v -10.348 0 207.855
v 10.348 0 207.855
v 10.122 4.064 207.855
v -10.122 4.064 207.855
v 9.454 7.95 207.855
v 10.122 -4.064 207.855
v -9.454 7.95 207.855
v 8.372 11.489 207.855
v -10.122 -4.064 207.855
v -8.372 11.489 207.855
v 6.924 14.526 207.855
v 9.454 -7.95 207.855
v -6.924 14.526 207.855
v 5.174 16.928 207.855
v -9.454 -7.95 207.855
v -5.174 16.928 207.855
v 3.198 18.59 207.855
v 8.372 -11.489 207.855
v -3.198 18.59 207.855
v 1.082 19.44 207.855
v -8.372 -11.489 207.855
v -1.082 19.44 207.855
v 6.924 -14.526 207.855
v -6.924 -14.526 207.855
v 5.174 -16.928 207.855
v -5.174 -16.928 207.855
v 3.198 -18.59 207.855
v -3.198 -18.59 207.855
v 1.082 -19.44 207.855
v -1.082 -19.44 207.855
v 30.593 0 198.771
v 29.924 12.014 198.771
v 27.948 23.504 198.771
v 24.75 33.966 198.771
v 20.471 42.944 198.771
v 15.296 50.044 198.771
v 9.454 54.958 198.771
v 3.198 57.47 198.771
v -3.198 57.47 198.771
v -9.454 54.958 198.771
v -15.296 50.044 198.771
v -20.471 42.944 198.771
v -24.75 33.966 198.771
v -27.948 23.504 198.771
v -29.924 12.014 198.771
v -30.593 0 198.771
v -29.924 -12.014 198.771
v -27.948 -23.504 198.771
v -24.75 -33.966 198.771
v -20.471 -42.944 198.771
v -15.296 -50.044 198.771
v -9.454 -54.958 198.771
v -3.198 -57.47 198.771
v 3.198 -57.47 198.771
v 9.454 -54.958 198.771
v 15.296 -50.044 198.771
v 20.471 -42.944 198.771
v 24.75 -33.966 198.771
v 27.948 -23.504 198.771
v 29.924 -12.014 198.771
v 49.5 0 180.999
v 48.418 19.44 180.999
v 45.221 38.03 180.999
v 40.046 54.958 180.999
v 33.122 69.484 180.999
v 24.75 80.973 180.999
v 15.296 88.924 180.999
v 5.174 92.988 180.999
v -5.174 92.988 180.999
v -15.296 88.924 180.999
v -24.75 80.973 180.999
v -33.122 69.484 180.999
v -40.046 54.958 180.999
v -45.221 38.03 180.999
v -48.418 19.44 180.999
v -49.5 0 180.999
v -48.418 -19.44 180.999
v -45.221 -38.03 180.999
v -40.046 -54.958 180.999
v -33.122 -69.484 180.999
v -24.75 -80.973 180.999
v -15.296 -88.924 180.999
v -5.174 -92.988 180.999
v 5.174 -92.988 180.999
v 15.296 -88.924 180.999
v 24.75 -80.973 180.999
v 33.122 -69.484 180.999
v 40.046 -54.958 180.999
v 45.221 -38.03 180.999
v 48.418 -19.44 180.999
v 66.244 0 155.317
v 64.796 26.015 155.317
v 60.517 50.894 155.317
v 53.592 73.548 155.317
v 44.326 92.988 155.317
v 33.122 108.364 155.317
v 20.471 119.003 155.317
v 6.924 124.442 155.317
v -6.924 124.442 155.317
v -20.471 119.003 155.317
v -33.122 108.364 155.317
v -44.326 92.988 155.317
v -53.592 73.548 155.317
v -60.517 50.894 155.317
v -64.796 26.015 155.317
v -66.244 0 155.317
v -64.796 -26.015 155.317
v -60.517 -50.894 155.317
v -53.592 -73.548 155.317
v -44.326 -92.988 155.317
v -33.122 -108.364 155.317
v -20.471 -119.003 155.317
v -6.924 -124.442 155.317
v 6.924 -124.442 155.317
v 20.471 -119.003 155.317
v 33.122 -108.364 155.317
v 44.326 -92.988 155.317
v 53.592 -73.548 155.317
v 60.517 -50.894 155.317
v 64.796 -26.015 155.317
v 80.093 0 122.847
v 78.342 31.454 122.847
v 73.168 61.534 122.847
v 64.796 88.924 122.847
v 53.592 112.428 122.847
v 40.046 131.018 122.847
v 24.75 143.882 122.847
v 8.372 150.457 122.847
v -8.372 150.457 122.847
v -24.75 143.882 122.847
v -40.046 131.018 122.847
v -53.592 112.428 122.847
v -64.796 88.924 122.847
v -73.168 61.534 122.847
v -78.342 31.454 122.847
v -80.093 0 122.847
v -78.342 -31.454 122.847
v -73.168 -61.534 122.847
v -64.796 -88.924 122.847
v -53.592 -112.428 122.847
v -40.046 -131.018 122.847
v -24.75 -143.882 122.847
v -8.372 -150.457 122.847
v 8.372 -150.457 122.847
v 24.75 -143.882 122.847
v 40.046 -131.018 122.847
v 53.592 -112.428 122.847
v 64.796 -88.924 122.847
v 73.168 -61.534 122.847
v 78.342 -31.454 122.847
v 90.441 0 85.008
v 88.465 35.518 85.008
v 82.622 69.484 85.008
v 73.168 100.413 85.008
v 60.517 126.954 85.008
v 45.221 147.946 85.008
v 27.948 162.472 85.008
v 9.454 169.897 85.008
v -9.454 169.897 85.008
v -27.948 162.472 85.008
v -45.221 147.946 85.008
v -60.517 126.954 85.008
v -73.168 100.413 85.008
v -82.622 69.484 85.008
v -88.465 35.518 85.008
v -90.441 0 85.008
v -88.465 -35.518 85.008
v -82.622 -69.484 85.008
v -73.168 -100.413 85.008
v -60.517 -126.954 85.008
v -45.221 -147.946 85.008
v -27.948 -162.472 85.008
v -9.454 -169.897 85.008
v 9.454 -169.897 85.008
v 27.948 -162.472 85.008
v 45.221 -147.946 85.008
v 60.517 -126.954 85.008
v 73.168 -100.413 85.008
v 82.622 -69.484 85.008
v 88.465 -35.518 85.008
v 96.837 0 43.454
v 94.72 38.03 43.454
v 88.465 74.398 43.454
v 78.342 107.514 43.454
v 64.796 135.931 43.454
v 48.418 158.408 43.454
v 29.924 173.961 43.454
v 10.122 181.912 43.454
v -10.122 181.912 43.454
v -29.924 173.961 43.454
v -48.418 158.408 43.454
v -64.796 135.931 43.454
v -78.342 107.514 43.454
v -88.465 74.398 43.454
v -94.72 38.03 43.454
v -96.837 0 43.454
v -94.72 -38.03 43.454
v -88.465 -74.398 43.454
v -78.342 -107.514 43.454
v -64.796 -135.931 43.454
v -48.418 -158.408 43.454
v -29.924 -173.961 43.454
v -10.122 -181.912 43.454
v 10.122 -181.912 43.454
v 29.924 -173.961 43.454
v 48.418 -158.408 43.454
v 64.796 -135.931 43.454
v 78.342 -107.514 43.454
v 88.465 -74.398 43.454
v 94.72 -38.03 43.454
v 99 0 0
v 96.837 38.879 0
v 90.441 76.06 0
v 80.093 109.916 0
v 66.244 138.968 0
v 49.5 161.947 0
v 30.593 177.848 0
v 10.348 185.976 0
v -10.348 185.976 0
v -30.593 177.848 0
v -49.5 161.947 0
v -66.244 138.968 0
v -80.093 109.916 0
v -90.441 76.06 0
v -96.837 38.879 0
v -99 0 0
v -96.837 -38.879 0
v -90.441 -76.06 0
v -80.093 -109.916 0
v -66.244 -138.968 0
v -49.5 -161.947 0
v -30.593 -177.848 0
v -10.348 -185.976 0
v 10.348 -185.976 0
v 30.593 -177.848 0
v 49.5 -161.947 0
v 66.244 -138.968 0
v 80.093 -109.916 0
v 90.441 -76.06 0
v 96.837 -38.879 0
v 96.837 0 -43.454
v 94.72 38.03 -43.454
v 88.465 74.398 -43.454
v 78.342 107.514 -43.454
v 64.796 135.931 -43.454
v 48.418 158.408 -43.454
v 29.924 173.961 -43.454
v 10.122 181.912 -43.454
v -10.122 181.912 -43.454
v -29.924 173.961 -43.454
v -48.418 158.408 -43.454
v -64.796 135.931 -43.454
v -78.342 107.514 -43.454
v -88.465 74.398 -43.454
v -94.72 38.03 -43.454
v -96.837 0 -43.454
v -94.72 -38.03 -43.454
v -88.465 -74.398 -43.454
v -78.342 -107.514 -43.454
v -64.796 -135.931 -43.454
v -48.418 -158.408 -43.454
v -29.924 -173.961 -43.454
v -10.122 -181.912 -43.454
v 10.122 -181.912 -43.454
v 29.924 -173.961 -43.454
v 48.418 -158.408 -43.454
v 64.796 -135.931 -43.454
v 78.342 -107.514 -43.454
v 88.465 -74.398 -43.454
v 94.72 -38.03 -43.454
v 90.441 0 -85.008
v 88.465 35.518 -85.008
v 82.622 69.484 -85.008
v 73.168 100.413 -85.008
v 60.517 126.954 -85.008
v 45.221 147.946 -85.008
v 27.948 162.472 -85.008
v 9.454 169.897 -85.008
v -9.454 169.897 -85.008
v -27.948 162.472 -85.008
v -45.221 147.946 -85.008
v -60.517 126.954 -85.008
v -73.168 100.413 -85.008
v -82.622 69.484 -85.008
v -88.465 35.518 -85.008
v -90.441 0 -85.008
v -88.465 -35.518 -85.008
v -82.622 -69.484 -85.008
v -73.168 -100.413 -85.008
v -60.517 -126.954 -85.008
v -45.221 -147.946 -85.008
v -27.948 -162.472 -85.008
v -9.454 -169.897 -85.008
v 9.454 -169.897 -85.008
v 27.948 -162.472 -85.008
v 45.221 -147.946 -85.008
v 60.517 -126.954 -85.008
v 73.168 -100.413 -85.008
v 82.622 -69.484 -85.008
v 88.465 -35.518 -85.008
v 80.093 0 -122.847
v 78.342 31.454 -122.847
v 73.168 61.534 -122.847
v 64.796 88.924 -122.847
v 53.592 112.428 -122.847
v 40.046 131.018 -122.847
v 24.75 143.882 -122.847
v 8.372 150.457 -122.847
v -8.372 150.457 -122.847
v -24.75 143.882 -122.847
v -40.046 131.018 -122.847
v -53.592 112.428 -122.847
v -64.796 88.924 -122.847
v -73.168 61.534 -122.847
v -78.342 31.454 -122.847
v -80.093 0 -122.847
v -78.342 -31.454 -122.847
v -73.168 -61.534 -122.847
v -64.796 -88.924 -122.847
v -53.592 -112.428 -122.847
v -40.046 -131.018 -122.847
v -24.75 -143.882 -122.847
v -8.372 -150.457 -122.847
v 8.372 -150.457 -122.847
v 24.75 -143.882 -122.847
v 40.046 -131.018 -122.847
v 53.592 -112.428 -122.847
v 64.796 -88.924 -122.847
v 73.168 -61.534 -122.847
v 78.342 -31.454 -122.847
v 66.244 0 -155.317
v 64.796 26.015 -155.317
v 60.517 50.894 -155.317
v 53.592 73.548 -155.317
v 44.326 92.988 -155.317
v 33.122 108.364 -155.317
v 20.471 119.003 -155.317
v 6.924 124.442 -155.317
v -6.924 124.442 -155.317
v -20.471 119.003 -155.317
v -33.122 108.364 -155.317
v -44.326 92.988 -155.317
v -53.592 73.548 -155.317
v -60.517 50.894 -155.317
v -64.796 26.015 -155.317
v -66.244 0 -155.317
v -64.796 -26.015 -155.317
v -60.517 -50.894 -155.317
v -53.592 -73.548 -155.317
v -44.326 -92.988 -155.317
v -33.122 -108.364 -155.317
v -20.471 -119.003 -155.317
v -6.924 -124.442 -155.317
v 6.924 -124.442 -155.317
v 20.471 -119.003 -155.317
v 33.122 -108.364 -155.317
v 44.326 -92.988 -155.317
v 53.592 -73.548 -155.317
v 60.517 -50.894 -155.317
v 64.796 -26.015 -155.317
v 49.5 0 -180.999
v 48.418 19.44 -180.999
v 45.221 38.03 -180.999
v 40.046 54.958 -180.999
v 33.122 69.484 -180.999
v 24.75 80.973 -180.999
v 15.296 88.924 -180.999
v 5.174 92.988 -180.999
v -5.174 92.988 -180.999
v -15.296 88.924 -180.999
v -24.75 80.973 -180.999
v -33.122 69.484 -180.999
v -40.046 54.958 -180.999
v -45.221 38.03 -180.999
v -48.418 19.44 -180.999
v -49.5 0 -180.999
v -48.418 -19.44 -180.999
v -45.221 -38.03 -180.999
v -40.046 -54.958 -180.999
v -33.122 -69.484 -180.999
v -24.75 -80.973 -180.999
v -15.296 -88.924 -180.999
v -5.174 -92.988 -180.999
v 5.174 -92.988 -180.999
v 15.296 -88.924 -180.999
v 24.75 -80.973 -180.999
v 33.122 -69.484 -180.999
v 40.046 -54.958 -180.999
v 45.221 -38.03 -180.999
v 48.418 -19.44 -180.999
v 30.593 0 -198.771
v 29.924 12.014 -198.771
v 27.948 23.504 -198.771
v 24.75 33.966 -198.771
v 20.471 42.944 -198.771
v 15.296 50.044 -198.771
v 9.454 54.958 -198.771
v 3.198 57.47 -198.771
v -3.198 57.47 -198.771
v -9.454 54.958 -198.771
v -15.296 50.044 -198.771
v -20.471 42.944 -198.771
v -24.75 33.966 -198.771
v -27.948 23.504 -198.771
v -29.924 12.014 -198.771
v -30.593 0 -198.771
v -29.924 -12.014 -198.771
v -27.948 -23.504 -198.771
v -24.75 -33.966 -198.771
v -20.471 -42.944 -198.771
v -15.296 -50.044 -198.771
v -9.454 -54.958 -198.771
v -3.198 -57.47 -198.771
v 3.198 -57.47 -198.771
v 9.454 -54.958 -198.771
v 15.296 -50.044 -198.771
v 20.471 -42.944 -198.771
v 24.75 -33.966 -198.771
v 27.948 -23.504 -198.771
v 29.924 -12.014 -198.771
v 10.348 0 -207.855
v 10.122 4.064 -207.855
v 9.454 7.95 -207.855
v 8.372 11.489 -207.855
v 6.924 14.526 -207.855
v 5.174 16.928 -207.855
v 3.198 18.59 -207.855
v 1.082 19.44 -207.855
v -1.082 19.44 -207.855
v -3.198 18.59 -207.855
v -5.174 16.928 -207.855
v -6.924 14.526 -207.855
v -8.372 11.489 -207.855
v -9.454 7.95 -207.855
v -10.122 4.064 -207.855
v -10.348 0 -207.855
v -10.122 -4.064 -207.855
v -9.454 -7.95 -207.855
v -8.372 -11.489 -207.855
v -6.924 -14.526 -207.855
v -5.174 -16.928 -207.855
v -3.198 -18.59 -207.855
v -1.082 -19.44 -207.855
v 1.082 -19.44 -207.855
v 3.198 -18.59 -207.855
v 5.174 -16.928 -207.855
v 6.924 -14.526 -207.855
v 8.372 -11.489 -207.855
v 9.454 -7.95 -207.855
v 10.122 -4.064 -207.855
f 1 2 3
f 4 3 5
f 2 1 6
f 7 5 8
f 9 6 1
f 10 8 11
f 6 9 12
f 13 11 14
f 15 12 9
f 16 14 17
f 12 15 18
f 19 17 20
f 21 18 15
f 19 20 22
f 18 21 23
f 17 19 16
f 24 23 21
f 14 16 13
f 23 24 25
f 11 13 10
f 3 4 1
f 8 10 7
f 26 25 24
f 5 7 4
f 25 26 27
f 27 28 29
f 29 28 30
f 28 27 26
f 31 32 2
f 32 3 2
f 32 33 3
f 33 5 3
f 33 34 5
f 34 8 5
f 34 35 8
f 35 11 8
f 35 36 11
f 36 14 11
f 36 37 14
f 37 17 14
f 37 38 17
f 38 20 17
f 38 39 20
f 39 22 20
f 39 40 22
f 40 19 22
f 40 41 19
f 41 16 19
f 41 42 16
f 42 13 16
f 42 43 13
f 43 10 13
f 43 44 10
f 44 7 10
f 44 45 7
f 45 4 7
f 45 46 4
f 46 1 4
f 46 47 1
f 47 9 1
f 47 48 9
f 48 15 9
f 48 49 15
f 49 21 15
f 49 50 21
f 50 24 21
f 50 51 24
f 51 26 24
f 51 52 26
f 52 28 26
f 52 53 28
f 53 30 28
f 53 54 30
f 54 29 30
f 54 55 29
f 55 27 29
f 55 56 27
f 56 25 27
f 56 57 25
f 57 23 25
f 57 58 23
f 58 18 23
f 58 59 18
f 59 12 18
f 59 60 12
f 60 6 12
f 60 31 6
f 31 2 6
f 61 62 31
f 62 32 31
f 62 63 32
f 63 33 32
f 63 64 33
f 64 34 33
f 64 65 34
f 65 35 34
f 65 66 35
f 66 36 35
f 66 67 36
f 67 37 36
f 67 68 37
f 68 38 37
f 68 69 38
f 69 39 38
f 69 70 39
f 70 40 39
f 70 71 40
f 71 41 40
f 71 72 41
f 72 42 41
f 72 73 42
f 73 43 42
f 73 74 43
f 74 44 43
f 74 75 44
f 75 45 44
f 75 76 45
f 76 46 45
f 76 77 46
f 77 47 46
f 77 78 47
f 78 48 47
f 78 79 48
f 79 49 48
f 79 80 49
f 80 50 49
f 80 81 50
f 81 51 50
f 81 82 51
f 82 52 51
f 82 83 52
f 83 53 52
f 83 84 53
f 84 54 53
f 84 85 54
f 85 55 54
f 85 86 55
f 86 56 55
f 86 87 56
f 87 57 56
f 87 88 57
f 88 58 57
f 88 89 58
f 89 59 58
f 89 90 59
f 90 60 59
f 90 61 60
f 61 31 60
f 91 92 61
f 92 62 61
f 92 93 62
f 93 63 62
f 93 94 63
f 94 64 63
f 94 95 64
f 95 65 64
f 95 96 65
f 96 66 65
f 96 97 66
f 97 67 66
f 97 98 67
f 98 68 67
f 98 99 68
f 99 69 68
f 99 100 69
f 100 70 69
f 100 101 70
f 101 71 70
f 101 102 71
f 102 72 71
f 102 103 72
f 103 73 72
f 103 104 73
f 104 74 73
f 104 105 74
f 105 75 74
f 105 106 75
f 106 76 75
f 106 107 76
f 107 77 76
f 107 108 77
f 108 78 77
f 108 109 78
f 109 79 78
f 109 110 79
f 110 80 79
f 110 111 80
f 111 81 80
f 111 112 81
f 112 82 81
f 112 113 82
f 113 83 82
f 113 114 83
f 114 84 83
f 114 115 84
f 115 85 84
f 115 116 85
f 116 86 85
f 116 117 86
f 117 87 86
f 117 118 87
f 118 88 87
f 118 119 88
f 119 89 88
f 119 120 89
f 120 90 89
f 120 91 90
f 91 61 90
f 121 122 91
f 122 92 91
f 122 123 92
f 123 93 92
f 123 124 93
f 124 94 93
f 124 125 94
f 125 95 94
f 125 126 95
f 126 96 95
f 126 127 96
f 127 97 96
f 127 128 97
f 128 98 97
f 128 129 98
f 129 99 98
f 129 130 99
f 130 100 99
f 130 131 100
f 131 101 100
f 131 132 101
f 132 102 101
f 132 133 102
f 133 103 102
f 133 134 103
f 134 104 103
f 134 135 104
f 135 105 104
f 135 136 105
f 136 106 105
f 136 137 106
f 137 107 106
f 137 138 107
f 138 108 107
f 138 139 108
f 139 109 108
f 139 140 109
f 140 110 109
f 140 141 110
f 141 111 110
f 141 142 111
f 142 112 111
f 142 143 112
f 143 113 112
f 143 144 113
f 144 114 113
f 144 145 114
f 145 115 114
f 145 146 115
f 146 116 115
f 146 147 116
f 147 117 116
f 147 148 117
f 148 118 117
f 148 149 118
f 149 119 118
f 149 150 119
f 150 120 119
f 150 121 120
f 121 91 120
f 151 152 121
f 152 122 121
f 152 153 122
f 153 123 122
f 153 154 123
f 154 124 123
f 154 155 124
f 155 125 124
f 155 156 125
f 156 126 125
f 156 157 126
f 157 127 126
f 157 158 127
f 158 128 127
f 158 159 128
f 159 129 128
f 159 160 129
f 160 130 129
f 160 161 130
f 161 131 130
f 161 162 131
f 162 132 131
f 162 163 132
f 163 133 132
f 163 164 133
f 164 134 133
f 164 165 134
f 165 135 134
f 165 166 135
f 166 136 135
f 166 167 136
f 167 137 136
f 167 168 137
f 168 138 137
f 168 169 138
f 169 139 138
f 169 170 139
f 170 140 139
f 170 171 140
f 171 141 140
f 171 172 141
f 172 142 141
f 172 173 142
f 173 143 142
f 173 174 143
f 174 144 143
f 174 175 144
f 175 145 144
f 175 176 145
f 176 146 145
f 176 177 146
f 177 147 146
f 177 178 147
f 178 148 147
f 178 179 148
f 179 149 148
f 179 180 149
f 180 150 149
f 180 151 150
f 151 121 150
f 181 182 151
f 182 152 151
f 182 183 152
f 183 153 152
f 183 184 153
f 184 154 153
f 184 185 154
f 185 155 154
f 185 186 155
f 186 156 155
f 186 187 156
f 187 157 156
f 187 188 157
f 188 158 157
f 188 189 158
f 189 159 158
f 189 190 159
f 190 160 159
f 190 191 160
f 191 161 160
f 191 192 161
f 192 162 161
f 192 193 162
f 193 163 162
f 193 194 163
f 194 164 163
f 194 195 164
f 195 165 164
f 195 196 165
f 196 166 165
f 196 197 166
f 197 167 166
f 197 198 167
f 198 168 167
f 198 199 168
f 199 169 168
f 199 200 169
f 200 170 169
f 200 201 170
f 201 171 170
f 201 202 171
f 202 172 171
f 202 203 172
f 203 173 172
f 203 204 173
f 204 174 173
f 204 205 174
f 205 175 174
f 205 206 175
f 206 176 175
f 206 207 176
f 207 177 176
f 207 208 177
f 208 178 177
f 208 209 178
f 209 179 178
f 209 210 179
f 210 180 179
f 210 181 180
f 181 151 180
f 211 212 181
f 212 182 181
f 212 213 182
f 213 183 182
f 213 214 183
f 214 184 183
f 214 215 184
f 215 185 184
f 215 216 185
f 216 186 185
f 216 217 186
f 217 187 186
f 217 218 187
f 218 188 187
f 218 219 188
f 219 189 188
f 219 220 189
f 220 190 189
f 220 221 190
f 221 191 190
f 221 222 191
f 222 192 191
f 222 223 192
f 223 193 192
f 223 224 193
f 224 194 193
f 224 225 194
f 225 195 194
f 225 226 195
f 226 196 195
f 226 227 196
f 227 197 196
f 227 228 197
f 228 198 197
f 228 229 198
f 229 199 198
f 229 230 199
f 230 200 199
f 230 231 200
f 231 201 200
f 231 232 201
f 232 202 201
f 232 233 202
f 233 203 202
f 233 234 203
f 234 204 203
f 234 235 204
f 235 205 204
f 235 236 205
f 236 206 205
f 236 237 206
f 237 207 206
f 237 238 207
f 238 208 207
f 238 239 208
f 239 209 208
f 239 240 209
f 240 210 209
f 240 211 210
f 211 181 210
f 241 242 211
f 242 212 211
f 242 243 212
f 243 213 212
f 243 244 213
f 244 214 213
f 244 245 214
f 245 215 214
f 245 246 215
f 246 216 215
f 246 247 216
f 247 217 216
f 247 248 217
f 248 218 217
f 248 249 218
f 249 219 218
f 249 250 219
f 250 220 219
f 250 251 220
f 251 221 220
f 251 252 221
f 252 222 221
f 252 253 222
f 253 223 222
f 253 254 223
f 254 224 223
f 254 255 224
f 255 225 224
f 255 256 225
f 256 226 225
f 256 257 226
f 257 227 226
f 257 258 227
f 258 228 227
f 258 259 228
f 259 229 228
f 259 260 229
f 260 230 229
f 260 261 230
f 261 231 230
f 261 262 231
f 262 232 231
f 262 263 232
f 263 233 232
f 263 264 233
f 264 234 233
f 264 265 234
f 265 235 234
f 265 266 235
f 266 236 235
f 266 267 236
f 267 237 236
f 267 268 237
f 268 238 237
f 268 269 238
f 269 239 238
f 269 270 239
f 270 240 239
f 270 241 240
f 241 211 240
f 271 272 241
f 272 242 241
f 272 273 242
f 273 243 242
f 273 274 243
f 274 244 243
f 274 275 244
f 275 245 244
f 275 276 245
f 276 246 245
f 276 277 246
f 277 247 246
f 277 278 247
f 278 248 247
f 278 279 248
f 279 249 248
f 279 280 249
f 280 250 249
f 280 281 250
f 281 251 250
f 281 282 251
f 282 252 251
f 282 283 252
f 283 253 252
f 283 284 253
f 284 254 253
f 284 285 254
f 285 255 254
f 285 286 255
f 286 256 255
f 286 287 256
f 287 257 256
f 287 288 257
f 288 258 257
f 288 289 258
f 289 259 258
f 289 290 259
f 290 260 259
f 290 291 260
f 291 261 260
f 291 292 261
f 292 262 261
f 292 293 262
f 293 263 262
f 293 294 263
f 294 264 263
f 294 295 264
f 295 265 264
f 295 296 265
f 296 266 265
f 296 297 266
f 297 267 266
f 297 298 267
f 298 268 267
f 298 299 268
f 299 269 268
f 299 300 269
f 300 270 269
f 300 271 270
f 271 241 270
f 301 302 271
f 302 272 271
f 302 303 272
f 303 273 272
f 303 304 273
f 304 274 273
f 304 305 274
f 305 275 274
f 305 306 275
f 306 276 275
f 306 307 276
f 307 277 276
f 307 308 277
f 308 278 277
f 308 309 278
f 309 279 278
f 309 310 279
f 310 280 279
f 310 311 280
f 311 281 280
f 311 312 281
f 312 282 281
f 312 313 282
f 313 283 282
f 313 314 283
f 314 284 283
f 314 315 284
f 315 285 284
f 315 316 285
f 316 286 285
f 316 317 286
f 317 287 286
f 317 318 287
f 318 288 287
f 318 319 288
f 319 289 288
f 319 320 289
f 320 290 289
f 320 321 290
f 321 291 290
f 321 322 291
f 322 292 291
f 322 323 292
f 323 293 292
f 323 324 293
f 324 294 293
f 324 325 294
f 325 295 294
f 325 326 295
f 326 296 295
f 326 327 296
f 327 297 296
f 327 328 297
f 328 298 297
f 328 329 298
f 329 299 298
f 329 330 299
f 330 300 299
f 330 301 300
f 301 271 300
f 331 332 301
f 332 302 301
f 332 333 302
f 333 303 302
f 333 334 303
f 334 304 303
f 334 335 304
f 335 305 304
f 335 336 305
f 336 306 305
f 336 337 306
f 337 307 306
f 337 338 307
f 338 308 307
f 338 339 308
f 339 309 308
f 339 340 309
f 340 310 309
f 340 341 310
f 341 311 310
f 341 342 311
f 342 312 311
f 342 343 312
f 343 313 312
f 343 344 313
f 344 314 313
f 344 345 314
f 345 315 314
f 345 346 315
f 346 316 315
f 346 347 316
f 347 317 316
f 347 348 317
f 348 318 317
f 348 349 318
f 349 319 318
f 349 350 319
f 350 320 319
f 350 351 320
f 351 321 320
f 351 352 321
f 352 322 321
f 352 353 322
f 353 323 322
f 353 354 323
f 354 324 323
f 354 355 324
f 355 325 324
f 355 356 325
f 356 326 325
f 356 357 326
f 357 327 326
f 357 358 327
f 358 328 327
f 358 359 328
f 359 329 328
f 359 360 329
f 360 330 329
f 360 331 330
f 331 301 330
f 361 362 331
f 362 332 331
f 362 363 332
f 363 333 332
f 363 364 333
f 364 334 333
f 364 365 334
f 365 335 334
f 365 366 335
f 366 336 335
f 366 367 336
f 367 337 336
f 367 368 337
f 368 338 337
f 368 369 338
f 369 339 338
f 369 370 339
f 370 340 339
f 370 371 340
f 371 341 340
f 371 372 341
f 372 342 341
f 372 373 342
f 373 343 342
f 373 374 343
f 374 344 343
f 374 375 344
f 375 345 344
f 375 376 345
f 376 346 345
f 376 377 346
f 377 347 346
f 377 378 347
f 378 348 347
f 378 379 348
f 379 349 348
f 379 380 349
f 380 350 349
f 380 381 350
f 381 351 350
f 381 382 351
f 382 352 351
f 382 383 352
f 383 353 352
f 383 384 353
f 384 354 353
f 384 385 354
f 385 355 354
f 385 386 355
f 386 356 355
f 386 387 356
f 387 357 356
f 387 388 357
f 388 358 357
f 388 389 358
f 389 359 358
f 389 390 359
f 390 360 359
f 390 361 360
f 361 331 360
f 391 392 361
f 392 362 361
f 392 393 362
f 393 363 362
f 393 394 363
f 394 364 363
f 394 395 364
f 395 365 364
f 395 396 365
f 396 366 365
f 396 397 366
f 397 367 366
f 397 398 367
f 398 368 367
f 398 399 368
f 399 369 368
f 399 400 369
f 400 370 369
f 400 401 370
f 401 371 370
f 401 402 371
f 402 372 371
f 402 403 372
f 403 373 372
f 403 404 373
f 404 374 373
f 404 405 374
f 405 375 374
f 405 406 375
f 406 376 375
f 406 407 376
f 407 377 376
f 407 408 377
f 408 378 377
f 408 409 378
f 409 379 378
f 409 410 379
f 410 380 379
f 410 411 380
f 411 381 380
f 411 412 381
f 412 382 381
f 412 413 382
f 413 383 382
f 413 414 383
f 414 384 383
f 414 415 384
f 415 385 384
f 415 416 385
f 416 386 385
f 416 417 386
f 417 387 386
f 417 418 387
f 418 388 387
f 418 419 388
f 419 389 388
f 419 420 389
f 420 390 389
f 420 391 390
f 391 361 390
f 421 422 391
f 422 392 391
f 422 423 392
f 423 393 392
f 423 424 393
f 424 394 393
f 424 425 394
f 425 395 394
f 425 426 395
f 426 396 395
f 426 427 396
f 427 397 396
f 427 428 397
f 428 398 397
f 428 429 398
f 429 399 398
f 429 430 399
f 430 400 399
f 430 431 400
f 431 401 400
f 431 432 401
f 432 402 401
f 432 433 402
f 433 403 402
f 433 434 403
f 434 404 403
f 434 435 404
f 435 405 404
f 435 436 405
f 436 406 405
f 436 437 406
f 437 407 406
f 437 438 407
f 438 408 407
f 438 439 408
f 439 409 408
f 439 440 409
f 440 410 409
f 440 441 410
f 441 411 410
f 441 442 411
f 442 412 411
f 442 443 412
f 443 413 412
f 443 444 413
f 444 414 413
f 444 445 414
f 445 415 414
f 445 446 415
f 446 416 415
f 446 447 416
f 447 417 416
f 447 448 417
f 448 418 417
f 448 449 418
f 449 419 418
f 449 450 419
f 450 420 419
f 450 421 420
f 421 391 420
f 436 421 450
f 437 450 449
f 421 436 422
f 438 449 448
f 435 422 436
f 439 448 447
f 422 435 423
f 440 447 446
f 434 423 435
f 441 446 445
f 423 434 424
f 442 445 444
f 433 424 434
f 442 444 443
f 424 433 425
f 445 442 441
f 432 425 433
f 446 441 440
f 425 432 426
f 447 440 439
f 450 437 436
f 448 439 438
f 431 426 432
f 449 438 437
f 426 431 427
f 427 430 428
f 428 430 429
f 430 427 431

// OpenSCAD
// Generated by SolidPython 1.0.1 on 2020-07-29 00:46:49


scale(v = [9, 17, 19]) {
	sphere(r = 11);
}
/***********************************************
*********      SolidPython code:      **********
************************************************
 
# import packages: SolidPython
from solid import *
from solid.utils import *
from itertools import chain, combinations, permutations


class Resize:

    def __init__(self, scad_file):
        self.scad_file = scad_file
        #self.scad_file = import_scad(scad_file)
        # cone/cylinder param:
        self.r1 = 0
        self.r2 = 0
        self.h = 0
        # rectangular prism param:
        self.w = 0
        self.l = 0
        # ellipse param:
        self.r = 0

    # import OpenScad code (file name corresponds to shape)


    # classify shape + parameters
    def assign(self, param1, param2, param3):
        if self.scad_file == 'cone.scad':
            self.r1 = param1
            self.r2 = param2
            self.h = param3
        elif self.scad_file == 'cylinder.scad':
            self.r1 = param1
            self.r2 = param2
            self.h = param3
        elif self.scad_file == 'rectangularPrism.scad':
            self.h = param1
            self.l = param2
            self.w = param3
        else:
            self.r = param1
            self.h = param2

    # resize parameters
    def iterate(self):
        x = range(3, 20, 2)
        i = 1
        if self.scad_file == 'cone.scad':
            tempList = list(permutations(x, 2))
            for temp in tempList:
                param1 = temp[0]
                param2 = temp[1]
                filepath = 'produced_scad_files/' + 'cone' + str(param1) + '_' + str(param2) + '_' + '.scad'
                scad_render_to_file(cylinder(h=param1, r1=param2, r2=0), filepath)

        elif self.scad_file == 'cylinder.scad':
            tempList = list(permutations(x, 3))
            for temp in tempList:
                param1 = temp[0]
                param2 = temp[1]
                filepath = 'produced_scad_files/' + 'cylinder' + str(param1) + '_' + str(param2) + '_' + '.scad'
                scad_render_to_file(cylinder(h=param1, r1=param2, r2=param2), filepath)

        elif self.scad_file == 'rectangularPrism.scad':
            tempList = list(permutations(x, 3))
            for temp in tempList:
                param1 = temp[0]
                param2 = temp[1]
                param3 = temp[2]
                filepath = 'produced_scad_files/' + 'rectangularPrism' + str(param1) + '_' + str(param2) + '_' + str(
                    param3) + '.scad'
                scad_render_to_file(cube(size=(param1, param2, param3)), filepath)

        elif self.scad_file == 'ellipse.scad':
            tempList = list(permutations(x, 4))
            for temp in tempList:
                param1 = temp[0]
                param2 = temp[1]
                param3 = temp[2]
                param4 = temp[3]
                filepath = 'produced_scad_files/' + 'ellipse' + str(param1) + '_' + str(param2) + '_' + str(param3) + '_' + str(param4) + '.scad'
                scad_render_to_file(scale([param1, param2, param3])(sphere(r=param4)), filepath)

    def render_to_scadfile(self):
        scad_render_to_file(scad, 'example.scad') 
 
************************************************/
